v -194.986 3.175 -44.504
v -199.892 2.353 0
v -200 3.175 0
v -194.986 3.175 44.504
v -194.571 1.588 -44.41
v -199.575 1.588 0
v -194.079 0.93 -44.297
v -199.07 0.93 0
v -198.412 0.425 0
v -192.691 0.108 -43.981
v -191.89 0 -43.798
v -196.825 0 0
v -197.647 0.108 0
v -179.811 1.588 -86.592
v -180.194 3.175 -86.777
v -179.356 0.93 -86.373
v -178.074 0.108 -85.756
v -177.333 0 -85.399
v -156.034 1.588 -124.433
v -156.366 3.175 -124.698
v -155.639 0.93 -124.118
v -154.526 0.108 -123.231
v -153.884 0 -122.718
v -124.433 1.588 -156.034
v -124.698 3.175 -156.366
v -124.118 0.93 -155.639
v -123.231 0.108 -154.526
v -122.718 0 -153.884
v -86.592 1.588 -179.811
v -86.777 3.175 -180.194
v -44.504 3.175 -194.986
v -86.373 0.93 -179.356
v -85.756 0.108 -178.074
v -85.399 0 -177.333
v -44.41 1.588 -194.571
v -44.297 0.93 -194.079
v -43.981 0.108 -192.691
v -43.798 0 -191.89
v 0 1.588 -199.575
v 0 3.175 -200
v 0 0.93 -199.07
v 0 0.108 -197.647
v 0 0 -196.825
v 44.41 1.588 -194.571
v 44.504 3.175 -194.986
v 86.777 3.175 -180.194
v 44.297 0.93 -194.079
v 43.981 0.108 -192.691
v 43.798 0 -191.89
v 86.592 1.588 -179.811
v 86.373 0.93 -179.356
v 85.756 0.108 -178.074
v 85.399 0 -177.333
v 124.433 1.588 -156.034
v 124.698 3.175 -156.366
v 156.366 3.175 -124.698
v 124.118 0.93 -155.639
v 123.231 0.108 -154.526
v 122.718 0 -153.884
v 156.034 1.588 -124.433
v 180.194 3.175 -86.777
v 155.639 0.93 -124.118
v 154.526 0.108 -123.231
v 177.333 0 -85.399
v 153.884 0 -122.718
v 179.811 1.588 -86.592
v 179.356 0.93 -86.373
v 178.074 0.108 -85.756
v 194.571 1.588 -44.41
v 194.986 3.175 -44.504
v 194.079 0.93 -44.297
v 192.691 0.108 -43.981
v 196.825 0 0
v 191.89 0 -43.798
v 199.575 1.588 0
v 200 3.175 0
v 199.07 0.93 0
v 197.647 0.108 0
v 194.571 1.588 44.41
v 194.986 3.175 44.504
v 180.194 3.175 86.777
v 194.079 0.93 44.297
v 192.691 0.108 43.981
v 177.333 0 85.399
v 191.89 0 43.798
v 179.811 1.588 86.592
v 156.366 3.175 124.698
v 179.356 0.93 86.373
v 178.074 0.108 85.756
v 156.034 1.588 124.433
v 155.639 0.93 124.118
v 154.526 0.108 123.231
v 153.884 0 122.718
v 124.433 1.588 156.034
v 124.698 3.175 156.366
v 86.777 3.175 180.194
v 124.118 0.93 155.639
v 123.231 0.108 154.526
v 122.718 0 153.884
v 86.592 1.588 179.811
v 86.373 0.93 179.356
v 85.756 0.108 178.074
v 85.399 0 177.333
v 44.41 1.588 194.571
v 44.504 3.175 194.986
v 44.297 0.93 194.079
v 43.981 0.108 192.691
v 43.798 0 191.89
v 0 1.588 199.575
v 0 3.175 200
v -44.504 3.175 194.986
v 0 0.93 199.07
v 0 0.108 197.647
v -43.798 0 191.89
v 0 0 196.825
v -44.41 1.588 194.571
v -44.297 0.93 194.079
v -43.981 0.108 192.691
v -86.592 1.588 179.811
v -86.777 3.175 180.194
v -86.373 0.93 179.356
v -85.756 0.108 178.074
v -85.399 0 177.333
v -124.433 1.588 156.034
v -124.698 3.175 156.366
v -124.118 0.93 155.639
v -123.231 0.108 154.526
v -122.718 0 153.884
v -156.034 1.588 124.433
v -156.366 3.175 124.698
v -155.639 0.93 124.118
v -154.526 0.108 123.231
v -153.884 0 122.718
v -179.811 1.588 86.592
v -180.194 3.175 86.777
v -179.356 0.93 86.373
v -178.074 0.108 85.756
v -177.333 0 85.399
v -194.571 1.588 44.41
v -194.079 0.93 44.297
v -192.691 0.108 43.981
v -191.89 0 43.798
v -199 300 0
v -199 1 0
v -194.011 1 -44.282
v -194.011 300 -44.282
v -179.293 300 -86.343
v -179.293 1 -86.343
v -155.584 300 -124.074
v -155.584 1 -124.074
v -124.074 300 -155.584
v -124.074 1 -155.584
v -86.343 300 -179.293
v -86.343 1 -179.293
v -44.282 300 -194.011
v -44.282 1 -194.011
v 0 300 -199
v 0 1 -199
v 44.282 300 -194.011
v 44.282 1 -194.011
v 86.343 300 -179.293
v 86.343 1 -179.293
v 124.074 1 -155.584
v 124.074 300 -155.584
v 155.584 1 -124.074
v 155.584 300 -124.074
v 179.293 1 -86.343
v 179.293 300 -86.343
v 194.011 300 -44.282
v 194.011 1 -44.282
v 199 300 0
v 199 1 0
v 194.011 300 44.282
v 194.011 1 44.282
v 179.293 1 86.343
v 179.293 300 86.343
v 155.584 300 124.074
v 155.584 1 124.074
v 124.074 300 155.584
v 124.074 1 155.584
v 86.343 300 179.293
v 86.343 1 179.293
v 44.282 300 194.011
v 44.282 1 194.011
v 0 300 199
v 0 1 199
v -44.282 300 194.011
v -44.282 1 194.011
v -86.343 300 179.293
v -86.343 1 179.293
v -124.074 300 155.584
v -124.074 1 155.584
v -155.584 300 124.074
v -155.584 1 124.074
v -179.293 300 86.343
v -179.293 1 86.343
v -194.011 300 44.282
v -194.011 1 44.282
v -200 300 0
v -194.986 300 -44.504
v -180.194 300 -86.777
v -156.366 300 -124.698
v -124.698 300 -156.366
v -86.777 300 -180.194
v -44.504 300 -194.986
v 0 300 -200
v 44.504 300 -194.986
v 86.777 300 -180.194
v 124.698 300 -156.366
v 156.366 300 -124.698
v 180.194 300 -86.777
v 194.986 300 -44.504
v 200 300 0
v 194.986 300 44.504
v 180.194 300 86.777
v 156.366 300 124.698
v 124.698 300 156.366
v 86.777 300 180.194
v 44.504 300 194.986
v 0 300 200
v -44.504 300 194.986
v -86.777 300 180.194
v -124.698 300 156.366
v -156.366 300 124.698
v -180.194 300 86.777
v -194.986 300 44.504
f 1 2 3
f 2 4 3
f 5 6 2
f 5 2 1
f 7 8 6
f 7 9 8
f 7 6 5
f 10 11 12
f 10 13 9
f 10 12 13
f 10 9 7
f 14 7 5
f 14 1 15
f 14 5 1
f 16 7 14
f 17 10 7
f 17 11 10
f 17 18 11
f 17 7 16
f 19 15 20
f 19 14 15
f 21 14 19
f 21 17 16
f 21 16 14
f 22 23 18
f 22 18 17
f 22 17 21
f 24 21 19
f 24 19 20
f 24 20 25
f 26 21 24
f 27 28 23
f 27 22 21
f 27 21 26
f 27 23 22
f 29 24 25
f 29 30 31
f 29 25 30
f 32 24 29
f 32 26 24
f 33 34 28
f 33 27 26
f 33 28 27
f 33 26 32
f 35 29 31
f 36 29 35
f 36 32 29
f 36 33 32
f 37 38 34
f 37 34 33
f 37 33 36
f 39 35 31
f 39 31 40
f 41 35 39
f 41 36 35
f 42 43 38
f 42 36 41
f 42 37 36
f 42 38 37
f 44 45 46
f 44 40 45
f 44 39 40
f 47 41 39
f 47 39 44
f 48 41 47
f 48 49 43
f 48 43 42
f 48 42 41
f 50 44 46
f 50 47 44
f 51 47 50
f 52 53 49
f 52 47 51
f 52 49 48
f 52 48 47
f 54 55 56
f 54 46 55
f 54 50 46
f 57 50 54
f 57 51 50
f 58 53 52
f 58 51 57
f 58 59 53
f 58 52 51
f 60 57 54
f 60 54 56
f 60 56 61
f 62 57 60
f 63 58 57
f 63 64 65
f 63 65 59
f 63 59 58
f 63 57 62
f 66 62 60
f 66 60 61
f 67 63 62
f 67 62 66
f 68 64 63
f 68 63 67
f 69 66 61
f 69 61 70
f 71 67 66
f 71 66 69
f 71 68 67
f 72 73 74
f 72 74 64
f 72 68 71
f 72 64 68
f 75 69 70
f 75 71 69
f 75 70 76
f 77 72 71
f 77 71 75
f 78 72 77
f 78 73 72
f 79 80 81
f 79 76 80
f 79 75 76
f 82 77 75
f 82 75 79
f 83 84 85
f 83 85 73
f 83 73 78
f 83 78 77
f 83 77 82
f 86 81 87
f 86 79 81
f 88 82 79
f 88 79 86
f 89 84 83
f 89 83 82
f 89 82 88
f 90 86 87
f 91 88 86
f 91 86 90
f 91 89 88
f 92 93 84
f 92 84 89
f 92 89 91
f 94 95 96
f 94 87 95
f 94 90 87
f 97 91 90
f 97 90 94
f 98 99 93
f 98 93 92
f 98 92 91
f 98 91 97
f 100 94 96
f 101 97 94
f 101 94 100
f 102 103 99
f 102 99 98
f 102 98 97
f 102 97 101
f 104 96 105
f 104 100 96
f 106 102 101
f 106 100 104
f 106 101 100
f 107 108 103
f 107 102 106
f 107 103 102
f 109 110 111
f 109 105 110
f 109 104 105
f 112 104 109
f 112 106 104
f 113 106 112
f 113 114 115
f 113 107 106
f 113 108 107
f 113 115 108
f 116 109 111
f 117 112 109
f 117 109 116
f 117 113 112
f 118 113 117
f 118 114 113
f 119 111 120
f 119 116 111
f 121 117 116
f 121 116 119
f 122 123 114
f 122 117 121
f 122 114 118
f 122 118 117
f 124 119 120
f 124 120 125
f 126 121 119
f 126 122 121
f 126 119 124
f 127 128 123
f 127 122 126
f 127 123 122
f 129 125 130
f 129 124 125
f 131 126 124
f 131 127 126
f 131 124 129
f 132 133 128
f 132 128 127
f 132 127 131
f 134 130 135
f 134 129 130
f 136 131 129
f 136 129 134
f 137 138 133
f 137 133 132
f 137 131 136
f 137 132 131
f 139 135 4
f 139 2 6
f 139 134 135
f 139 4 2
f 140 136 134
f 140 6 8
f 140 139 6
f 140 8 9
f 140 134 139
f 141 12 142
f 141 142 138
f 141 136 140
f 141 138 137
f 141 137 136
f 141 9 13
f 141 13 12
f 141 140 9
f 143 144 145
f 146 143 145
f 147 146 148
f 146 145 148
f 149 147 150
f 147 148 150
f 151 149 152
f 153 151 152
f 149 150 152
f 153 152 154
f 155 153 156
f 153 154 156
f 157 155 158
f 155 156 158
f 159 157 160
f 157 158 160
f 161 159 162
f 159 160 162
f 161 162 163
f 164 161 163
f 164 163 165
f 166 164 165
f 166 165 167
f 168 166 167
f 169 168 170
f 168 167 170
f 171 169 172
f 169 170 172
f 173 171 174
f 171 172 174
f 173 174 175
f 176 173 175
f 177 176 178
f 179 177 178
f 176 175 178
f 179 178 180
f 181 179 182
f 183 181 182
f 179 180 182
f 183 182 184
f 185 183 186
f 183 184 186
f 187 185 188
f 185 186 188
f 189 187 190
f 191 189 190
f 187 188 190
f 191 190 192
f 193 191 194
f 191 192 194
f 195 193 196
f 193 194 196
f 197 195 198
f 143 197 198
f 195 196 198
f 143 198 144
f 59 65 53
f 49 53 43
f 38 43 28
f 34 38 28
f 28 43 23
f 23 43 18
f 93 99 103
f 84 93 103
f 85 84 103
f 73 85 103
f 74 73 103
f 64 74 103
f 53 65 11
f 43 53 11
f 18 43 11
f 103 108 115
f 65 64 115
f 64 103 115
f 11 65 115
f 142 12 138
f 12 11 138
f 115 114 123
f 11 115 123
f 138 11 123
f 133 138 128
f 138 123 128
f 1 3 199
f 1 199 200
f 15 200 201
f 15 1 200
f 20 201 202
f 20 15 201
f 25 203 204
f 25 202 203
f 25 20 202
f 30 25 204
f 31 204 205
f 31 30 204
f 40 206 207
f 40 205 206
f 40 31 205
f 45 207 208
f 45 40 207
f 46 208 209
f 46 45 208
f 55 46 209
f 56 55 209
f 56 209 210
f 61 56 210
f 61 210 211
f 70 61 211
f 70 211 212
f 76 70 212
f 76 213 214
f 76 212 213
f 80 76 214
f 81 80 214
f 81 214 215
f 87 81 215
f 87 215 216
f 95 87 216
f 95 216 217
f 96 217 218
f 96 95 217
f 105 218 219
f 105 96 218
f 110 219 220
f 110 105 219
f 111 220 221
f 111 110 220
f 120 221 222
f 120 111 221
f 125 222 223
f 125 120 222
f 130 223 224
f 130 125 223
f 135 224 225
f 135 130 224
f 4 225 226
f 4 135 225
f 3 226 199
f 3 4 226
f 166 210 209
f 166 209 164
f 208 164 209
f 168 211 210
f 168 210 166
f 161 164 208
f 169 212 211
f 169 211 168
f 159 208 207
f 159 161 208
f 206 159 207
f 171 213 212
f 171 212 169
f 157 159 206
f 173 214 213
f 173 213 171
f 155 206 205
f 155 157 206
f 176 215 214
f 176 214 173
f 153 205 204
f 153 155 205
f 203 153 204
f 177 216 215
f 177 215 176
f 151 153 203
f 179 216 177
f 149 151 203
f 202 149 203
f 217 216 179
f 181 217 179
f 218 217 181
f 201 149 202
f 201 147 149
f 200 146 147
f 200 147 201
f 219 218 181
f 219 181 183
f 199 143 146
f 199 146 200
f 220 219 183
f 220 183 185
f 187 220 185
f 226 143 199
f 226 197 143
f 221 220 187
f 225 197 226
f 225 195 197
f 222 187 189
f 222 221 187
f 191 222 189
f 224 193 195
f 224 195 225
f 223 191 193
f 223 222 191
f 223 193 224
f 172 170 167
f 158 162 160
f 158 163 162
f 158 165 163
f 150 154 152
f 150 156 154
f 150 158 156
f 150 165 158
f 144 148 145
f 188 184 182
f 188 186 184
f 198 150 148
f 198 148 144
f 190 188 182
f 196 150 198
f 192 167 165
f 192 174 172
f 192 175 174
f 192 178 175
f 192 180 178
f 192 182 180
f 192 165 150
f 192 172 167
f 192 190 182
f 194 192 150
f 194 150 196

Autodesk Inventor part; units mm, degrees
ref_plane "YZ Plane" through (0, 0, 0) normal (1, 0, 0) x (0, 1, 0)
ref_plane "XZ Plane" through (0, 0, 0) normal (0, 1, 0) x (-1, 0, 0)
ref_plane "XY Plane" through (0, 0, 0) normal (0, 0, 1) x (1, 0, 0)
sketch "Sketch1" plane through (0, 0, 0) normal (0, 1, 0) x (-1, 0, 0)
  circle A0 centre (0, 0) radius 200
  dimension "d0" = 400
extrude "Extrusion1" add sketch "Sketch1" along normal blind 300
shell "Shell1" thickness 1 removed faces 1 at (26.6799, 300, 17.8469)
fillet "Fillet1" radius 3.175 1 edges at (200, 0, 0)
properties part number "distilate_tank"
